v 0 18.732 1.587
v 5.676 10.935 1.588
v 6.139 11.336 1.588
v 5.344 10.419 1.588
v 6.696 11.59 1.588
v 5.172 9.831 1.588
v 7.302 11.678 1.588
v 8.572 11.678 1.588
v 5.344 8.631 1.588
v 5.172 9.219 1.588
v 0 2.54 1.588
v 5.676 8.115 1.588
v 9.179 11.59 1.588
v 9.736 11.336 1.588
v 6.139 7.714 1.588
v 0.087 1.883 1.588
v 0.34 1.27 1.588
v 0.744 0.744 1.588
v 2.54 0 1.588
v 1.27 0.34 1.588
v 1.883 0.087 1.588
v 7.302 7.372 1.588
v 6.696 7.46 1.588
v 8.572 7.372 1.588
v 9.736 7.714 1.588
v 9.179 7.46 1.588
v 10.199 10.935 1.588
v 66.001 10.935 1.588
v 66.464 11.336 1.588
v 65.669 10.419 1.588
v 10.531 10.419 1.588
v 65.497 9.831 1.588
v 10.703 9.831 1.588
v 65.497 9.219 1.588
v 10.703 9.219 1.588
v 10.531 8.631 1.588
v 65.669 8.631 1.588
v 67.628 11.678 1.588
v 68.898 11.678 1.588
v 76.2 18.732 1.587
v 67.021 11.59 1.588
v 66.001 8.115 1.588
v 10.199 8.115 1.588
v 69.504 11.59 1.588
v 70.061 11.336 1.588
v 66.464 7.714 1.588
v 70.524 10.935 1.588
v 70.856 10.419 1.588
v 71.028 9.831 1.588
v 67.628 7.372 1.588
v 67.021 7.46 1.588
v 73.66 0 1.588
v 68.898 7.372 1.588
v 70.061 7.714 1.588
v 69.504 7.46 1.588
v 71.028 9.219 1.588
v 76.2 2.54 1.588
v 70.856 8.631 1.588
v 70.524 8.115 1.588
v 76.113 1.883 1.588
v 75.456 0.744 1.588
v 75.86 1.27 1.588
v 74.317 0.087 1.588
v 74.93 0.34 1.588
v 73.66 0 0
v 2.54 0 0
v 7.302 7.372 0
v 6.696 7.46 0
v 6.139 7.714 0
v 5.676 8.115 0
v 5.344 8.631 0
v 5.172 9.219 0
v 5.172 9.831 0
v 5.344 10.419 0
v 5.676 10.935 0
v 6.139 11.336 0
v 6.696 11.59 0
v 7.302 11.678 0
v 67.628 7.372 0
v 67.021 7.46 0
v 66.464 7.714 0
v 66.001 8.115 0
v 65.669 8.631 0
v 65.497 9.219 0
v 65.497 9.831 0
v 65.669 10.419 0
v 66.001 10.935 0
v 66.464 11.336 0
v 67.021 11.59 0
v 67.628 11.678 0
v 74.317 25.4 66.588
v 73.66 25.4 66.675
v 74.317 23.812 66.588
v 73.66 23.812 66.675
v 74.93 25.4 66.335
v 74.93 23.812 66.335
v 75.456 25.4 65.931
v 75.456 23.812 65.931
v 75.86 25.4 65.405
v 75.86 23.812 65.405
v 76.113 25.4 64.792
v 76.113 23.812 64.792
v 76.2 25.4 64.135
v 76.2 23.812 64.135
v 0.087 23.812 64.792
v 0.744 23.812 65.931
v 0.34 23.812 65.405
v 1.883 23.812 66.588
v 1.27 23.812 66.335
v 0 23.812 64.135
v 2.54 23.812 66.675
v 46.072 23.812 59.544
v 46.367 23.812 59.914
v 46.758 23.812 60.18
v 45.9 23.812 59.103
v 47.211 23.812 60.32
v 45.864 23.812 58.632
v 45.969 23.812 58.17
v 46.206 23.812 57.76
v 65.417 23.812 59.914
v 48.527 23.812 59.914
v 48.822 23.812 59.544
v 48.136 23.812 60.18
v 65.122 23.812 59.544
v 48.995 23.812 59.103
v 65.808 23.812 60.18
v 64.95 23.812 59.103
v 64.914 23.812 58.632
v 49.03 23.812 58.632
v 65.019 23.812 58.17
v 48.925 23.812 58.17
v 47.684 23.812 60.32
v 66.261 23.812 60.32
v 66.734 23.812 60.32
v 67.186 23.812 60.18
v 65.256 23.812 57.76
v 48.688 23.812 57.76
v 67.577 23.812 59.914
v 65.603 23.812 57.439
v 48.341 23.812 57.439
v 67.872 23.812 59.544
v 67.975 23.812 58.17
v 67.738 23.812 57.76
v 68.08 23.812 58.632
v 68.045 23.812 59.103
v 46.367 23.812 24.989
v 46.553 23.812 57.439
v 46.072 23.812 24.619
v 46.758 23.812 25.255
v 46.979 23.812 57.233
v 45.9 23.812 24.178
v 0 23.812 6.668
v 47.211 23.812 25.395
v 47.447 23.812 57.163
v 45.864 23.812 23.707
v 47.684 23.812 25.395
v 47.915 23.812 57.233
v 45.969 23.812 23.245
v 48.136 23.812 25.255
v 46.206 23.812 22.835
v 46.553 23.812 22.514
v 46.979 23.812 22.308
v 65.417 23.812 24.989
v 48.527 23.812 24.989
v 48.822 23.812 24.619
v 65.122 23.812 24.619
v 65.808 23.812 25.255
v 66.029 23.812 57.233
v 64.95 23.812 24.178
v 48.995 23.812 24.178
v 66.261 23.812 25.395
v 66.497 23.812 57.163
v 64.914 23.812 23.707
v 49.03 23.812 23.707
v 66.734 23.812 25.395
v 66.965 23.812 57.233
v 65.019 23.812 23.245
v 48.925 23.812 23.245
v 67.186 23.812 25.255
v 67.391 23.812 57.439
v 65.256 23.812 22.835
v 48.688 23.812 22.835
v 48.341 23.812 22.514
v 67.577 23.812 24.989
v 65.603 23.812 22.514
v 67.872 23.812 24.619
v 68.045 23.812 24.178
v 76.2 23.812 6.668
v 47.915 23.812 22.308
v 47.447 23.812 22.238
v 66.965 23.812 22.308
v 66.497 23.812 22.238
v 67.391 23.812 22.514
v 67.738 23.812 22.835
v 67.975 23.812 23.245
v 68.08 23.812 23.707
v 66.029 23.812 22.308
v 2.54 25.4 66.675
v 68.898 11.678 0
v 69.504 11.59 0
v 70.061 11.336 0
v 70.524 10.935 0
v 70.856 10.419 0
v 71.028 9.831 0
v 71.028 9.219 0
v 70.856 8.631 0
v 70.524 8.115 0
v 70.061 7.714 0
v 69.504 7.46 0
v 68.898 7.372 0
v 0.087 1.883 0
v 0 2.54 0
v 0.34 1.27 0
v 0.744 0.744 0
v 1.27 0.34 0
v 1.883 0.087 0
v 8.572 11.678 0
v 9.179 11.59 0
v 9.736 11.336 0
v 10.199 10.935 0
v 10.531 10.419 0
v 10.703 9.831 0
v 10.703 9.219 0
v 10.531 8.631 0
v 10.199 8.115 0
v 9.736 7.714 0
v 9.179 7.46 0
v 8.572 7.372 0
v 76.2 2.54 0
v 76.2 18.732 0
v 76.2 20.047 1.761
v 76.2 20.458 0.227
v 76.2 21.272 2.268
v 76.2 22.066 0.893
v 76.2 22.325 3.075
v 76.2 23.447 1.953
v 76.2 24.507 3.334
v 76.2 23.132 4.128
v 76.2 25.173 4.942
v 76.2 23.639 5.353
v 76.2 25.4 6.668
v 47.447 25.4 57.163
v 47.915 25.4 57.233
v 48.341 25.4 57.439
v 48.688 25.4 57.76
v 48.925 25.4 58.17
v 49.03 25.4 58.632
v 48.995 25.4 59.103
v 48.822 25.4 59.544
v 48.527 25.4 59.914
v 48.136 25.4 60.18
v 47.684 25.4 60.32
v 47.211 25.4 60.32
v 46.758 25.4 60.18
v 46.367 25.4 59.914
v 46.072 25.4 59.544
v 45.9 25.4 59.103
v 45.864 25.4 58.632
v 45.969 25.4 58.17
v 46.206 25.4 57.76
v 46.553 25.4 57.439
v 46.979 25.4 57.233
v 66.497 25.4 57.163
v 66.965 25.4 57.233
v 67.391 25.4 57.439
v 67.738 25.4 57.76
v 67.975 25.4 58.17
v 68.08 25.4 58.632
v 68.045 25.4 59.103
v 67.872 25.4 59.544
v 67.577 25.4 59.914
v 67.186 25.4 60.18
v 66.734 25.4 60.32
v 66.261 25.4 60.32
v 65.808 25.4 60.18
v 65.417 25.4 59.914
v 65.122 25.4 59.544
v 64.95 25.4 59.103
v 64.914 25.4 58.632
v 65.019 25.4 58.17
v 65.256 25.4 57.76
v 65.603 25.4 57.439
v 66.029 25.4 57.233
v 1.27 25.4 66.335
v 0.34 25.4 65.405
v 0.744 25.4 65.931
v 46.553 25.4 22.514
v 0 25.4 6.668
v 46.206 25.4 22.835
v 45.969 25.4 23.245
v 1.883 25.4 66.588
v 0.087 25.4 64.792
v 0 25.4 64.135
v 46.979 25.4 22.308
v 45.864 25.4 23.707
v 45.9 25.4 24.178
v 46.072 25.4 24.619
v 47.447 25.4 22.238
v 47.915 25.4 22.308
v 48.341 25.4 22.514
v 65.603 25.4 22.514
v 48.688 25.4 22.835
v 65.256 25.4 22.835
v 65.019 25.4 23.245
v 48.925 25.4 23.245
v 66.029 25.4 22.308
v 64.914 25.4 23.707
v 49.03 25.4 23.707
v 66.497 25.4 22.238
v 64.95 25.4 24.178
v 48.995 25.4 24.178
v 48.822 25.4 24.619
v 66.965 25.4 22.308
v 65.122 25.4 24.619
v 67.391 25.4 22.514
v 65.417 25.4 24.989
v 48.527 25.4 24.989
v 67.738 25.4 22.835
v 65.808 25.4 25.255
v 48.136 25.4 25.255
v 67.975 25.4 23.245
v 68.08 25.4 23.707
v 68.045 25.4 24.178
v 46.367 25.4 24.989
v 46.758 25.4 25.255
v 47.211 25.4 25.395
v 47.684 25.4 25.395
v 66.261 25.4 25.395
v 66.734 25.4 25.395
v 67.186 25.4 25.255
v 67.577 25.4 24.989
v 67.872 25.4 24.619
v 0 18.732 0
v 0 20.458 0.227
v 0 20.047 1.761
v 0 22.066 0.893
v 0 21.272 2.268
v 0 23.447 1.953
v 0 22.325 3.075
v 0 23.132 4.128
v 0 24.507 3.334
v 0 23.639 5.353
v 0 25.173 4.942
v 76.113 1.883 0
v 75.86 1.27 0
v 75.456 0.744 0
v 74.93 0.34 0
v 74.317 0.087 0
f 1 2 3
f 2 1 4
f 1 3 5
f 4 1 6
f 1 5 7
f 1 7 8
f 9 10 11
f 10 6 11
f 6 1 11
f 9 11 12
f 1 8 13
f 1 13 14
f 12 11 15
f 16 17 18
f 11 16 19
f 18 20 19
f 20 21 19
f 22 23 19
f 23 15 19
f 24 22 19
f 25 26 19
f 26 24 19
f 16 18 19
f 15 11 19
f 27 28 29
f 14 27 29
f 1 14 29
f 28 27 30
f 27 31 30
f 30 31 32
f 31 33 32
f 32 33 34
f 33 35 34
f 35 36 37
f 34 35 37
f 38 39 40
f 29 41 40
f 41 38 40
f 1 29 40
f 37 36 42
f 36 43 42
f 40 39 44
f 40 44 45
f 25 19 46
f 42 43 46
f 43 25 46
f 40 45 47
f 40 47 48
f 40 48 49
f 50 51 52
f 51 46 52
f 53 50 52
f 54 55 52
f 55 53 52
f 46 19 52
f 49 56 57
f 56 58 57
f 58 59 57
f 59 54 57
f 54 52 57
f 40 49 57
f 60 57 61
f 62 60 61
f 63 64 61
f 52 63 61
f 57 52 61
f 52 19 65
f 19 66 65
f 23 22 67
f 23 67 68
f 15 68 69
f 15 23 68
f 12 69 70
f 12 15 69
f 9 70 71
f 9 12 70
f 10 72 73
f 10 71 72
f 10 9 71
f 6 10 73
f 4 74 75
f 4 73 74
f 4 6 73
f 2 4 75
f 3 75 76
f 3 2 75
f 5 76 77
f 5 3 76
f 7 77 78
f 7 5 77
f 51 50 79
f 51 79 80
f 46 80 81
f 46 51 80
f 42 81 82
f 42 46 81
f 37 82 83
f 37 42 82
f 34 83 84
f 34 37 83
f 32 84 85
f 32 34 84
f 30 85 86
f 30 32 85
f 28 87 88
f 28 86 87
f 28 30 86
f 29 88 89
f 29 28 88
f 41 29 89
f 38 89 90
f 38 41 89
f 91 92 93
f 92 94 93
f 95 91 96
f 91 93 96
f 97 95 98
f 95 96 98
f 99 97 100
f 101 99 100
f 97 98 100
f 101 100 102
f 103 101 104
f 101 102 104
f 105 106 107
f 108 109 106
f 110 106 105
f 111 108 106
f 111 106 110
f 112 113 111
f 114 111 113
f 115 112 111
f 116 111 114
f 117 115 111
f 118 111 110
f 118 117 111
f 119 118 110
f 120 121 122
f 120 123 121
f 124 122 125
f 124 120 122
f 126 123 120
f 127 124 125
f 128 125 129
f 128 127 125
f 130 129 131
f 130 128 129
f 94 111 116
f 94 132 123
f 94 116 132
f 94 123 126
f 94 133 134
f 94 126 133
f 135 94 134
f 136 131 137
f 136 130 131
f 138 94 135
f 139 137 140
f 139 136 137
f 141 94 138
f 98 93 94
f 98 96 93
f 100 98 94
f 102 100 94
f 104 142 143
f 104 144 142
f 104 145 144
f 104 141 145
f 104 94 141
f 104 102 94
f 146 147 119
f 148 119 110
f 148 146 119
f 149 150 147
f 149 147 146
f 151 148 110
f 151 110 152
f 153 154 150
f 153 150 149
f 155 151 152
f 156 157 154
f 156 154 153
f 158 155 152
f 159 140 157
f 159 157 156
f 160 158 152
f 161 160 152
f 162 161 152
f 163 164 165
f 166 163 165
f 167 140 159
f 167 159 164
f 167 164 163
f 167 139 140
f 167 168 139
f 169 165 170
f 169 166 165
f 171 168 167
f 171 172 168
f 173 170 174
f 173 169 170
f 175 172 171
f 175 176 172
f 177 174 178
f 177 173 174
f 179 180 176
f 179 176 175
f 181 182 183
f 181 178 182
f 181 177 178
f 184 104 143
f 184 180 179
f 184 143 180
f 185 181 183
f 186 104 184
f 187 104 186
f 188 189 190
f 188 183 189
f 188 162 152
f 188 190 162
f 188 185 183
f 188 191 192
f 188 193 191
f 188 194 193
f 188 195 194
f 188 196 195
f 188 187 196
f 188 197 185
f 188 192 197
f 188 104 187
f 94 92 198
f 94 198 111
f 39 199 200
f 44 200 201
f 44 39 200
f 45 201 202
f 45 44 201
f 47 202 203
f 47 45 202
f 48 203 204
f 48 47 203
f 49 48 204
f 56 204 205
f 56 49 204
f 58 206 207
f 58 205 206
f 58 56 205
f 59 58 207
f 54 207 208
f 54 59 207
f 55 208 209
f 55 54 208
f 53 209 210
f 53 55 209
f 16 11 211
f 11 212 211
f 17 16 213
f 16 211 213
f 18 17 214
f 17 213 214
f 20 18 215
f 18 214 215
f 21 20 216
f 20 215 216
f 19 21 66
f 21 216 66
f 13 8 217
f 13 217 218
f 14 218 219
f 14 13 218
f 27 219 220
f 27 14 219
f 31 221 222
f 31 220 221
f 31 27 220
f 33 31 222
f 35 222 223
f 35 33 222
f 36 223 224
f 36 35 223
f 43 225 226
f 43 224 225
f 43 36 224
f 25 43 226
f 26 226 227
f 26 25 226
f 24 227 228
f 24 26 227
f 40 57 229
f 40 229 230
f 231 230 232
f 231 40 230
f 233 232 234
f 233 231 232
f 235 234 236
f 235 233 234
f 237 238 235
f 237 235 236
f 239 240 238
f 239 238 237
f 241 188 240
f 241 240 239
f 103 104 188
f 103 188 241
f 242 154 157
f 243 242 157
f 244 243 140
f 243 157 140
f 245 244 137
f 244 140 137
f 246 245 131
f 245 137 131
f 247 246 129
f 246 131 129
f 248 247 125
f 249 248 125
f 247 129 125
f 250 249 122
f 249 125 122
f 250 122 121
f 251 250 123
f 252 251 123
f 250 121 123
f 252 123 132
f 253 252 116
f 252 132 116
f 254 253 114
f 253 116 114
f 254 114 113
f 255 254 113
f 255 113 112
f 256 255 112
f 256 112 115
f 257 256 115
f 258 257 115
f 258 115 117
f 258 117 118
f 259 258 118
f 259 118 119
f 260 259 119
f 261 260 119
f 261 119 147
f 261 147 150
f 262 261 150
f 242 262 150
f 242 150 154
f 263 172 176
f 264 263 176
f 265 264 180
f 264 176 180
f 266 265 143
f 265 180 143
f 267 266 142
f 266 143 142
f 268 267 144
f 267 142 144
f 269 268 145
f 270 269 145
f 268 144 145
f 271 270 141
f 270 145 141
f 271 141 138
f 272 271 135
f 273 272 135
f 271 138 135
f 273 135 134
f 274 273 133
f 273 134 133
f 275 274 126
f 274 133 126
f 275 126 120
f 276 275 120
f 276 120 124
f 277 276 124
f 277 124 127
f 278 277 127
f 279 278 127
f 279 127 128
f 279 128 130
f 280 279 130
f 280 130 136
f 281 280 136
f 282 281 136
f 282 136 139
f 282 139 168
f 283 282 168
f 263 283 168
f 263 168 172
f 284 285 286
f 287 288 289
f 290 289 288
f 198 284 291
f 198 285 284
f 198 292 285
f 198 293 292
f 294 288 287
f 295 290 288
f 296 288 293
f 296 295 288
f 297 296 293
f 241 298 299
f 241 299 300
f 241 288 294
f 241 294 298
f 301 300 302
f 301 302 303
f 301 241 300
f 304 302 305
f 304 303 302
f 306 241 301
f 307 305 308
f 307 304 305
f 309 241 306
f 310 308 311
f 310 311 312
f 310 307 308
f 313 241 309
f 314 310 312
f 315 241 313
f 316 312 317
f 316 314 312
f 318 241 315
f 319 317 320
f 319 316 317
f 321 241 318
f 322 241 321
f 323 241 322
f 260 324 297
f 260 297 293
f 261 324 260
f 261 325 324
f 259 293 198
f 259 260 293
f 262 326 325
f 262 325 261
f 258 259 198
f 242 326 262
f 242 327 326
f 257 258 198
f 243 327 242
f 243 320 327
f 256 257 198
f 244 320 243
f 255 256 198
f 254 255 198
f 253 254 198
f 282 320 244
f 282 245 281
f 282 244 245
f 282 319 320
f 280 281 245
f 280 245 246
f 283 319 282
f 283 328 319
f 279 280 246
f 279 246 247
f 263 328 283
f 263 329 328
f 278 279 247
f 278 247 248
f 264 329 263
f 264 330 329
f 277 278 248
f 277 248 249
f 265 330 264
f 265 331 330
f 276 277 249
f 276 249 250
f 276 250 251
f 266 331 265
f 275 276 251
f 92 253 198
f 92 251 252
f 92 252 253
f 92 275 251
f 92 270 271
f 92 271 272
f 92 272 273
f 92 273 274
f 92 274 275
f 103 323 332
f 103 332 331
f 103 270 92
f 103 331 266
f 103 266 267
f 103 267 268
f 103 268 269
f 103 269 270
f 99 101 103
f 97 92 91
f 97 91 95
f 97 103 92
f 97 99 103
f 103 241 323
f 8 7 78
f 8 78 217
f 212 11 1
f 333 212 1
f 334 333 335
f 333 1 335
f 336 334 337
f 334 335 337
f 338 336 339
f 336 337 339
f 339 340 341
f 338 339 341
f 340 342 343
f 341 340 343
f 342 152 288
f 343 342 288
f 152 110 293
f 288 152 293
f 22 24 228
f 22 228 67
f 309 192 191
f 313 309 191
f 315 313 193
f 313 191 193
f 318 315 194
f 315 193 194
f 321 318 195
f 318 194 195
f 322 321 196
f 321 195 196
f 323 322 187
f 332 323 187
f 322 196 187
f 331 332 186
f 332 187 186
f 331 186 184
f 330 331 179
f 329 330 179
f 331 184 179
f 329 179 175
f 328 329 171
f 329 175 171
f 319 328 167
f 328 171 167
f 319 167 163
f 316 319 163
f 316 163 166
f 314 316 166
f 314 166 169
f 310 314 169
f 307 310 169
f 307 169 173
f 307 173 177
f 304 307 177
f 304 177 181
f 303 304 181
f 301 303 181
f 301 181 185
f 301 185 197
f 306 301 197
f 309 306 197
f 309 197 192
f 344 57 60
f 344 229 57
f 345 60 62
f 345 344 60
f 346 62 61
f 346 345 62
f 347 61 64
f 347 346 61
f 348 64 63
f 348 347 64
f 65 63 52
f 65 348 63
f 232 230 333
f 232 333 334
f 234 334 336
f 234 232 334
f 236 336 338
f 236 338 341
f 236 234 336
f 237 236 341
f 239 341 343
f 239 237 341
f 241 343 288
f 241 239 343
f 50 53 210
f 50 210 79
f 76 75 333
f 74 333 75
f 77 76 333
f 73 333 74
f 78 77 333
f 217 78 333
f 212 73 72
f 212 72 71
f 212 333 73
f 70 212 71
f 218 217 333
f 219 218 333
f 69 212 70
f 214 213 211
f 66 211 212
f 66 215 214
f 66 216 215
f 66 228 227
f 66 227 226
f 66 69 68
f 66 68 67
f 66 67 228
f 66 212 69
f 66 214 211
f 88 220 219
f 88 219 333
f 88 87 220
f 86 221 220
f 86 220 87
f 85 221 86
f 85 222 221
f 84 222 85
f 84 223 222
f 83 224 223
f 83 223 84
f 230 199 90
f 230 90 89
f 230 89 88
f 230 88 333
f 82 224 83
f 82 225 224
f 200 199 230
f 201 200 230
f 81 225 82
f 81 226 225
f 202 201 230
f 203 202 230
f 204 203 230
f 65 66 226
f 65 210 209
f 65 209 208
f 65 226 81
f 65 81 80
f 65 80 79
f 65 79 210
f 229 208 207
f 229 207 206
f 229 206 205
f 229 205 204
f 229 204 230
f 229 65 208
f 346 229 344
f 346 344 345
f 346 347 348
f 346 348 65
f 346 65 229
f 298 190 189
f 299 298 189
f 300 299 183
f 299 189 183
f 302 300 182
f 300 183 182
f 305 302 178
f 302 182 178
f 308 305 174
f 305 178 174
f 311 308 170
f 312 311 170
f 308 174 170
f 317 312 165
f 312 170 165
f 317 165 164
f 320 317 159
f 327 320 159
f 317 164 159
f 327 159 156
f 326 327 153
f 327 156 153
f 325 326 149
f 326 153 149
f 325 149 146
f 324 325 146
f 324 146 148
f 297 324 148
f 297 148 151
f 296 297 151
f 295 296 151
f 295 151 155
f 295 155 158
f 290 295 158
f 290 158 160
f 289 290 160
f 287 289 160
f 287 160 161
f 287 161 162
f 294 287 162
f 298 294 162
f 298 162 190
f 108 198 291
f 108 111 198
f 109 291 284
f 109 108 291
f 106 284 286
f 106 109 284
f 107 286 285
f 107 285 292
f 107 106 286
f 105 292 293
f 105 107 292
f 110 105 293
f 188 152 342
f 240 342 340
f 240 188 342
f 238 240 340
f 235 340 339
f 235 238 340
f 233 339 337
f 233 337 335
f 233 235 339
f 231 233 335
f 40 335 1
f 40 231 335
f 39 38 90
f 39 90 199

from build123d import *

# Parameters (mm, degrees)
SKETCH2_W                    = 76.2
SKETCH2_H                    = 1.5875
BASE_FLANGE1_DEPTH           = 25.4
EDGE_FLANGE1_STRIP_W         = 16.51
EDGE_FLANGE1_STRIP_H         = 1.5875
EDGE_FLANGE1_STRIP_CUT_DEPTH = 76.2
EDGE_FLANGE1_DEPTH           = 76.2
FILLET1_R                    = 2.54
CUT_EXTRUDE1_DEPTH           = 104.382699985
SKETCH11_R                   = 1.5875
CUT_EXTRUDE2_DEPTH           = 105.014570043


# Sheet-metal steps are written as plain solids
with BuildPart() as part:
    # Sketch2 → Base-Flange1 (new body)
    with BuildSketch(Plane(origin=(0, 0, 0), x_dir=(1, 0, 0), z_dir=(0, 1, 0))):
        with Locations((38.1, -0.79375)):
            Rectangle(SKETCH2_W, SKETCH2_H)
    extrude(amount=BASE_FLANGE1_DEPTH)

    # Edge-Flange1 strip (across the edge) → Edge-Flange1 strip cut (cut)
    with BuildSketch(Plane(origin=(76.2, 25.4, 1.5875), x_dir=(0, -1, 0), z_dir=(-1, 0, 0))):
        with Locations((-1.5875, -0.79375)):
            Rectangle(EDGE_FLANGE1_STRIP_W, EDGE_FLANGE1_STRIP_H)
    extrude(amount=EDGE_FLANGE1_STRIP_CUT_DEPTH, mode=Mode.SUBTRACT)

    # Edge-Flange1 section (across the edge) → Edge-Flange1 (add)
    with BuildSketch(Plane(origin=(76.2, 25.4, 1.5875), x_dir=(0, -1, 0), z_dir=(-1, 0, 0))):
        with BuildLine():
            Line((0, 5.08), (0, 65.0875))
            Line((0, 65.0875), (1.5875, 65.0875))
            Line((1.5875, 65.0875), (1.5875, 5.08))
            ThreePointArc((1.5875, 5.08), (3.075397552, 1.487897552), (6.6675, 0))
            Line((6.6675, 0), (6.6675, -1.5875))
            ThreePointArc((6.6675, -1.5875), (1.952865536, 0.365365536), (0, 5.08))
        make_face()
    extrude(amount=EDGE_FLANGE1_DEPTH)

    # Fillet1
    fillet1_edges = [part.edges().sort_by_distance(p)[0] for p in [
        (76.2, 24.60625, 66.675),
        (0, 24.60625, 66.675),
        (0, 0, 0.79375),
        (76.2, 0, 0.79375),
    ]]
    fillet(fillet1_edges, radius=FILLET1_R)

    # Sketch10 → Cut-Extrude1 (cut, through all)
    with BuildSketch(Plane.XY.offset(1.5875)):
        with BuildLine():
            Line((7.3025, 11.67765), (8.5725, 11.67765))
            ThreePointArc((8.5725, 11.67765), (10.72515, 9.525), (8.5725, 7.37235))
            Line((8.5725, 7.37235), (7.3025, 7.37235))
            ThreePointArc((7.3025, 7.37235), (5.14985, 9.525), (7.3025, 11.67765))
        make_face()
        with BuildLine():
            Line((67.6275, 11.67765), (68.8975, 11.67765))
            ThreePointArc((68.8975, 11.67765), (71.05015, 9.525), (68.8975, 7.37235))
            Line((68.8975, 7.37235), (67.6275, 7.37235))
            ThreePointArc((67.6275, 7.37235), (65.47485, 9.525), (67.6275, 11.67765))
        make_face()
    extrude(amount=-CUT_EXTRUDE1_DEPTH, mode=Mode.SUBTRACT)

    # Sketch11 → Cut-Extrude2 (cut, through all)
    with BuildSketch(Plane.XZ.offset(-23.8125)):
        with Locations(Location((66.4972, 58.7502, 0), (0, 0, 270))):
            Circle(SKETCH11_R)
        with Locations(Location((66.4972, 23.8252, 0), (0, 0, 270))):
            Circle(SKETCH11_R)
        with Locations(Location((47.4472, 23.8252, 0), (0, 0, 270))):
            Circle(SKETCH11_R)
        with Locations(Location((47.4472, 58.7502, 0), (0, 0, 270))):
            Circle(SKETCH11_R)
    extrude(amount=-CUT_EXTRUDE2_DEPTH, mode=Mode.SUBTRACT)


solid = part.part
